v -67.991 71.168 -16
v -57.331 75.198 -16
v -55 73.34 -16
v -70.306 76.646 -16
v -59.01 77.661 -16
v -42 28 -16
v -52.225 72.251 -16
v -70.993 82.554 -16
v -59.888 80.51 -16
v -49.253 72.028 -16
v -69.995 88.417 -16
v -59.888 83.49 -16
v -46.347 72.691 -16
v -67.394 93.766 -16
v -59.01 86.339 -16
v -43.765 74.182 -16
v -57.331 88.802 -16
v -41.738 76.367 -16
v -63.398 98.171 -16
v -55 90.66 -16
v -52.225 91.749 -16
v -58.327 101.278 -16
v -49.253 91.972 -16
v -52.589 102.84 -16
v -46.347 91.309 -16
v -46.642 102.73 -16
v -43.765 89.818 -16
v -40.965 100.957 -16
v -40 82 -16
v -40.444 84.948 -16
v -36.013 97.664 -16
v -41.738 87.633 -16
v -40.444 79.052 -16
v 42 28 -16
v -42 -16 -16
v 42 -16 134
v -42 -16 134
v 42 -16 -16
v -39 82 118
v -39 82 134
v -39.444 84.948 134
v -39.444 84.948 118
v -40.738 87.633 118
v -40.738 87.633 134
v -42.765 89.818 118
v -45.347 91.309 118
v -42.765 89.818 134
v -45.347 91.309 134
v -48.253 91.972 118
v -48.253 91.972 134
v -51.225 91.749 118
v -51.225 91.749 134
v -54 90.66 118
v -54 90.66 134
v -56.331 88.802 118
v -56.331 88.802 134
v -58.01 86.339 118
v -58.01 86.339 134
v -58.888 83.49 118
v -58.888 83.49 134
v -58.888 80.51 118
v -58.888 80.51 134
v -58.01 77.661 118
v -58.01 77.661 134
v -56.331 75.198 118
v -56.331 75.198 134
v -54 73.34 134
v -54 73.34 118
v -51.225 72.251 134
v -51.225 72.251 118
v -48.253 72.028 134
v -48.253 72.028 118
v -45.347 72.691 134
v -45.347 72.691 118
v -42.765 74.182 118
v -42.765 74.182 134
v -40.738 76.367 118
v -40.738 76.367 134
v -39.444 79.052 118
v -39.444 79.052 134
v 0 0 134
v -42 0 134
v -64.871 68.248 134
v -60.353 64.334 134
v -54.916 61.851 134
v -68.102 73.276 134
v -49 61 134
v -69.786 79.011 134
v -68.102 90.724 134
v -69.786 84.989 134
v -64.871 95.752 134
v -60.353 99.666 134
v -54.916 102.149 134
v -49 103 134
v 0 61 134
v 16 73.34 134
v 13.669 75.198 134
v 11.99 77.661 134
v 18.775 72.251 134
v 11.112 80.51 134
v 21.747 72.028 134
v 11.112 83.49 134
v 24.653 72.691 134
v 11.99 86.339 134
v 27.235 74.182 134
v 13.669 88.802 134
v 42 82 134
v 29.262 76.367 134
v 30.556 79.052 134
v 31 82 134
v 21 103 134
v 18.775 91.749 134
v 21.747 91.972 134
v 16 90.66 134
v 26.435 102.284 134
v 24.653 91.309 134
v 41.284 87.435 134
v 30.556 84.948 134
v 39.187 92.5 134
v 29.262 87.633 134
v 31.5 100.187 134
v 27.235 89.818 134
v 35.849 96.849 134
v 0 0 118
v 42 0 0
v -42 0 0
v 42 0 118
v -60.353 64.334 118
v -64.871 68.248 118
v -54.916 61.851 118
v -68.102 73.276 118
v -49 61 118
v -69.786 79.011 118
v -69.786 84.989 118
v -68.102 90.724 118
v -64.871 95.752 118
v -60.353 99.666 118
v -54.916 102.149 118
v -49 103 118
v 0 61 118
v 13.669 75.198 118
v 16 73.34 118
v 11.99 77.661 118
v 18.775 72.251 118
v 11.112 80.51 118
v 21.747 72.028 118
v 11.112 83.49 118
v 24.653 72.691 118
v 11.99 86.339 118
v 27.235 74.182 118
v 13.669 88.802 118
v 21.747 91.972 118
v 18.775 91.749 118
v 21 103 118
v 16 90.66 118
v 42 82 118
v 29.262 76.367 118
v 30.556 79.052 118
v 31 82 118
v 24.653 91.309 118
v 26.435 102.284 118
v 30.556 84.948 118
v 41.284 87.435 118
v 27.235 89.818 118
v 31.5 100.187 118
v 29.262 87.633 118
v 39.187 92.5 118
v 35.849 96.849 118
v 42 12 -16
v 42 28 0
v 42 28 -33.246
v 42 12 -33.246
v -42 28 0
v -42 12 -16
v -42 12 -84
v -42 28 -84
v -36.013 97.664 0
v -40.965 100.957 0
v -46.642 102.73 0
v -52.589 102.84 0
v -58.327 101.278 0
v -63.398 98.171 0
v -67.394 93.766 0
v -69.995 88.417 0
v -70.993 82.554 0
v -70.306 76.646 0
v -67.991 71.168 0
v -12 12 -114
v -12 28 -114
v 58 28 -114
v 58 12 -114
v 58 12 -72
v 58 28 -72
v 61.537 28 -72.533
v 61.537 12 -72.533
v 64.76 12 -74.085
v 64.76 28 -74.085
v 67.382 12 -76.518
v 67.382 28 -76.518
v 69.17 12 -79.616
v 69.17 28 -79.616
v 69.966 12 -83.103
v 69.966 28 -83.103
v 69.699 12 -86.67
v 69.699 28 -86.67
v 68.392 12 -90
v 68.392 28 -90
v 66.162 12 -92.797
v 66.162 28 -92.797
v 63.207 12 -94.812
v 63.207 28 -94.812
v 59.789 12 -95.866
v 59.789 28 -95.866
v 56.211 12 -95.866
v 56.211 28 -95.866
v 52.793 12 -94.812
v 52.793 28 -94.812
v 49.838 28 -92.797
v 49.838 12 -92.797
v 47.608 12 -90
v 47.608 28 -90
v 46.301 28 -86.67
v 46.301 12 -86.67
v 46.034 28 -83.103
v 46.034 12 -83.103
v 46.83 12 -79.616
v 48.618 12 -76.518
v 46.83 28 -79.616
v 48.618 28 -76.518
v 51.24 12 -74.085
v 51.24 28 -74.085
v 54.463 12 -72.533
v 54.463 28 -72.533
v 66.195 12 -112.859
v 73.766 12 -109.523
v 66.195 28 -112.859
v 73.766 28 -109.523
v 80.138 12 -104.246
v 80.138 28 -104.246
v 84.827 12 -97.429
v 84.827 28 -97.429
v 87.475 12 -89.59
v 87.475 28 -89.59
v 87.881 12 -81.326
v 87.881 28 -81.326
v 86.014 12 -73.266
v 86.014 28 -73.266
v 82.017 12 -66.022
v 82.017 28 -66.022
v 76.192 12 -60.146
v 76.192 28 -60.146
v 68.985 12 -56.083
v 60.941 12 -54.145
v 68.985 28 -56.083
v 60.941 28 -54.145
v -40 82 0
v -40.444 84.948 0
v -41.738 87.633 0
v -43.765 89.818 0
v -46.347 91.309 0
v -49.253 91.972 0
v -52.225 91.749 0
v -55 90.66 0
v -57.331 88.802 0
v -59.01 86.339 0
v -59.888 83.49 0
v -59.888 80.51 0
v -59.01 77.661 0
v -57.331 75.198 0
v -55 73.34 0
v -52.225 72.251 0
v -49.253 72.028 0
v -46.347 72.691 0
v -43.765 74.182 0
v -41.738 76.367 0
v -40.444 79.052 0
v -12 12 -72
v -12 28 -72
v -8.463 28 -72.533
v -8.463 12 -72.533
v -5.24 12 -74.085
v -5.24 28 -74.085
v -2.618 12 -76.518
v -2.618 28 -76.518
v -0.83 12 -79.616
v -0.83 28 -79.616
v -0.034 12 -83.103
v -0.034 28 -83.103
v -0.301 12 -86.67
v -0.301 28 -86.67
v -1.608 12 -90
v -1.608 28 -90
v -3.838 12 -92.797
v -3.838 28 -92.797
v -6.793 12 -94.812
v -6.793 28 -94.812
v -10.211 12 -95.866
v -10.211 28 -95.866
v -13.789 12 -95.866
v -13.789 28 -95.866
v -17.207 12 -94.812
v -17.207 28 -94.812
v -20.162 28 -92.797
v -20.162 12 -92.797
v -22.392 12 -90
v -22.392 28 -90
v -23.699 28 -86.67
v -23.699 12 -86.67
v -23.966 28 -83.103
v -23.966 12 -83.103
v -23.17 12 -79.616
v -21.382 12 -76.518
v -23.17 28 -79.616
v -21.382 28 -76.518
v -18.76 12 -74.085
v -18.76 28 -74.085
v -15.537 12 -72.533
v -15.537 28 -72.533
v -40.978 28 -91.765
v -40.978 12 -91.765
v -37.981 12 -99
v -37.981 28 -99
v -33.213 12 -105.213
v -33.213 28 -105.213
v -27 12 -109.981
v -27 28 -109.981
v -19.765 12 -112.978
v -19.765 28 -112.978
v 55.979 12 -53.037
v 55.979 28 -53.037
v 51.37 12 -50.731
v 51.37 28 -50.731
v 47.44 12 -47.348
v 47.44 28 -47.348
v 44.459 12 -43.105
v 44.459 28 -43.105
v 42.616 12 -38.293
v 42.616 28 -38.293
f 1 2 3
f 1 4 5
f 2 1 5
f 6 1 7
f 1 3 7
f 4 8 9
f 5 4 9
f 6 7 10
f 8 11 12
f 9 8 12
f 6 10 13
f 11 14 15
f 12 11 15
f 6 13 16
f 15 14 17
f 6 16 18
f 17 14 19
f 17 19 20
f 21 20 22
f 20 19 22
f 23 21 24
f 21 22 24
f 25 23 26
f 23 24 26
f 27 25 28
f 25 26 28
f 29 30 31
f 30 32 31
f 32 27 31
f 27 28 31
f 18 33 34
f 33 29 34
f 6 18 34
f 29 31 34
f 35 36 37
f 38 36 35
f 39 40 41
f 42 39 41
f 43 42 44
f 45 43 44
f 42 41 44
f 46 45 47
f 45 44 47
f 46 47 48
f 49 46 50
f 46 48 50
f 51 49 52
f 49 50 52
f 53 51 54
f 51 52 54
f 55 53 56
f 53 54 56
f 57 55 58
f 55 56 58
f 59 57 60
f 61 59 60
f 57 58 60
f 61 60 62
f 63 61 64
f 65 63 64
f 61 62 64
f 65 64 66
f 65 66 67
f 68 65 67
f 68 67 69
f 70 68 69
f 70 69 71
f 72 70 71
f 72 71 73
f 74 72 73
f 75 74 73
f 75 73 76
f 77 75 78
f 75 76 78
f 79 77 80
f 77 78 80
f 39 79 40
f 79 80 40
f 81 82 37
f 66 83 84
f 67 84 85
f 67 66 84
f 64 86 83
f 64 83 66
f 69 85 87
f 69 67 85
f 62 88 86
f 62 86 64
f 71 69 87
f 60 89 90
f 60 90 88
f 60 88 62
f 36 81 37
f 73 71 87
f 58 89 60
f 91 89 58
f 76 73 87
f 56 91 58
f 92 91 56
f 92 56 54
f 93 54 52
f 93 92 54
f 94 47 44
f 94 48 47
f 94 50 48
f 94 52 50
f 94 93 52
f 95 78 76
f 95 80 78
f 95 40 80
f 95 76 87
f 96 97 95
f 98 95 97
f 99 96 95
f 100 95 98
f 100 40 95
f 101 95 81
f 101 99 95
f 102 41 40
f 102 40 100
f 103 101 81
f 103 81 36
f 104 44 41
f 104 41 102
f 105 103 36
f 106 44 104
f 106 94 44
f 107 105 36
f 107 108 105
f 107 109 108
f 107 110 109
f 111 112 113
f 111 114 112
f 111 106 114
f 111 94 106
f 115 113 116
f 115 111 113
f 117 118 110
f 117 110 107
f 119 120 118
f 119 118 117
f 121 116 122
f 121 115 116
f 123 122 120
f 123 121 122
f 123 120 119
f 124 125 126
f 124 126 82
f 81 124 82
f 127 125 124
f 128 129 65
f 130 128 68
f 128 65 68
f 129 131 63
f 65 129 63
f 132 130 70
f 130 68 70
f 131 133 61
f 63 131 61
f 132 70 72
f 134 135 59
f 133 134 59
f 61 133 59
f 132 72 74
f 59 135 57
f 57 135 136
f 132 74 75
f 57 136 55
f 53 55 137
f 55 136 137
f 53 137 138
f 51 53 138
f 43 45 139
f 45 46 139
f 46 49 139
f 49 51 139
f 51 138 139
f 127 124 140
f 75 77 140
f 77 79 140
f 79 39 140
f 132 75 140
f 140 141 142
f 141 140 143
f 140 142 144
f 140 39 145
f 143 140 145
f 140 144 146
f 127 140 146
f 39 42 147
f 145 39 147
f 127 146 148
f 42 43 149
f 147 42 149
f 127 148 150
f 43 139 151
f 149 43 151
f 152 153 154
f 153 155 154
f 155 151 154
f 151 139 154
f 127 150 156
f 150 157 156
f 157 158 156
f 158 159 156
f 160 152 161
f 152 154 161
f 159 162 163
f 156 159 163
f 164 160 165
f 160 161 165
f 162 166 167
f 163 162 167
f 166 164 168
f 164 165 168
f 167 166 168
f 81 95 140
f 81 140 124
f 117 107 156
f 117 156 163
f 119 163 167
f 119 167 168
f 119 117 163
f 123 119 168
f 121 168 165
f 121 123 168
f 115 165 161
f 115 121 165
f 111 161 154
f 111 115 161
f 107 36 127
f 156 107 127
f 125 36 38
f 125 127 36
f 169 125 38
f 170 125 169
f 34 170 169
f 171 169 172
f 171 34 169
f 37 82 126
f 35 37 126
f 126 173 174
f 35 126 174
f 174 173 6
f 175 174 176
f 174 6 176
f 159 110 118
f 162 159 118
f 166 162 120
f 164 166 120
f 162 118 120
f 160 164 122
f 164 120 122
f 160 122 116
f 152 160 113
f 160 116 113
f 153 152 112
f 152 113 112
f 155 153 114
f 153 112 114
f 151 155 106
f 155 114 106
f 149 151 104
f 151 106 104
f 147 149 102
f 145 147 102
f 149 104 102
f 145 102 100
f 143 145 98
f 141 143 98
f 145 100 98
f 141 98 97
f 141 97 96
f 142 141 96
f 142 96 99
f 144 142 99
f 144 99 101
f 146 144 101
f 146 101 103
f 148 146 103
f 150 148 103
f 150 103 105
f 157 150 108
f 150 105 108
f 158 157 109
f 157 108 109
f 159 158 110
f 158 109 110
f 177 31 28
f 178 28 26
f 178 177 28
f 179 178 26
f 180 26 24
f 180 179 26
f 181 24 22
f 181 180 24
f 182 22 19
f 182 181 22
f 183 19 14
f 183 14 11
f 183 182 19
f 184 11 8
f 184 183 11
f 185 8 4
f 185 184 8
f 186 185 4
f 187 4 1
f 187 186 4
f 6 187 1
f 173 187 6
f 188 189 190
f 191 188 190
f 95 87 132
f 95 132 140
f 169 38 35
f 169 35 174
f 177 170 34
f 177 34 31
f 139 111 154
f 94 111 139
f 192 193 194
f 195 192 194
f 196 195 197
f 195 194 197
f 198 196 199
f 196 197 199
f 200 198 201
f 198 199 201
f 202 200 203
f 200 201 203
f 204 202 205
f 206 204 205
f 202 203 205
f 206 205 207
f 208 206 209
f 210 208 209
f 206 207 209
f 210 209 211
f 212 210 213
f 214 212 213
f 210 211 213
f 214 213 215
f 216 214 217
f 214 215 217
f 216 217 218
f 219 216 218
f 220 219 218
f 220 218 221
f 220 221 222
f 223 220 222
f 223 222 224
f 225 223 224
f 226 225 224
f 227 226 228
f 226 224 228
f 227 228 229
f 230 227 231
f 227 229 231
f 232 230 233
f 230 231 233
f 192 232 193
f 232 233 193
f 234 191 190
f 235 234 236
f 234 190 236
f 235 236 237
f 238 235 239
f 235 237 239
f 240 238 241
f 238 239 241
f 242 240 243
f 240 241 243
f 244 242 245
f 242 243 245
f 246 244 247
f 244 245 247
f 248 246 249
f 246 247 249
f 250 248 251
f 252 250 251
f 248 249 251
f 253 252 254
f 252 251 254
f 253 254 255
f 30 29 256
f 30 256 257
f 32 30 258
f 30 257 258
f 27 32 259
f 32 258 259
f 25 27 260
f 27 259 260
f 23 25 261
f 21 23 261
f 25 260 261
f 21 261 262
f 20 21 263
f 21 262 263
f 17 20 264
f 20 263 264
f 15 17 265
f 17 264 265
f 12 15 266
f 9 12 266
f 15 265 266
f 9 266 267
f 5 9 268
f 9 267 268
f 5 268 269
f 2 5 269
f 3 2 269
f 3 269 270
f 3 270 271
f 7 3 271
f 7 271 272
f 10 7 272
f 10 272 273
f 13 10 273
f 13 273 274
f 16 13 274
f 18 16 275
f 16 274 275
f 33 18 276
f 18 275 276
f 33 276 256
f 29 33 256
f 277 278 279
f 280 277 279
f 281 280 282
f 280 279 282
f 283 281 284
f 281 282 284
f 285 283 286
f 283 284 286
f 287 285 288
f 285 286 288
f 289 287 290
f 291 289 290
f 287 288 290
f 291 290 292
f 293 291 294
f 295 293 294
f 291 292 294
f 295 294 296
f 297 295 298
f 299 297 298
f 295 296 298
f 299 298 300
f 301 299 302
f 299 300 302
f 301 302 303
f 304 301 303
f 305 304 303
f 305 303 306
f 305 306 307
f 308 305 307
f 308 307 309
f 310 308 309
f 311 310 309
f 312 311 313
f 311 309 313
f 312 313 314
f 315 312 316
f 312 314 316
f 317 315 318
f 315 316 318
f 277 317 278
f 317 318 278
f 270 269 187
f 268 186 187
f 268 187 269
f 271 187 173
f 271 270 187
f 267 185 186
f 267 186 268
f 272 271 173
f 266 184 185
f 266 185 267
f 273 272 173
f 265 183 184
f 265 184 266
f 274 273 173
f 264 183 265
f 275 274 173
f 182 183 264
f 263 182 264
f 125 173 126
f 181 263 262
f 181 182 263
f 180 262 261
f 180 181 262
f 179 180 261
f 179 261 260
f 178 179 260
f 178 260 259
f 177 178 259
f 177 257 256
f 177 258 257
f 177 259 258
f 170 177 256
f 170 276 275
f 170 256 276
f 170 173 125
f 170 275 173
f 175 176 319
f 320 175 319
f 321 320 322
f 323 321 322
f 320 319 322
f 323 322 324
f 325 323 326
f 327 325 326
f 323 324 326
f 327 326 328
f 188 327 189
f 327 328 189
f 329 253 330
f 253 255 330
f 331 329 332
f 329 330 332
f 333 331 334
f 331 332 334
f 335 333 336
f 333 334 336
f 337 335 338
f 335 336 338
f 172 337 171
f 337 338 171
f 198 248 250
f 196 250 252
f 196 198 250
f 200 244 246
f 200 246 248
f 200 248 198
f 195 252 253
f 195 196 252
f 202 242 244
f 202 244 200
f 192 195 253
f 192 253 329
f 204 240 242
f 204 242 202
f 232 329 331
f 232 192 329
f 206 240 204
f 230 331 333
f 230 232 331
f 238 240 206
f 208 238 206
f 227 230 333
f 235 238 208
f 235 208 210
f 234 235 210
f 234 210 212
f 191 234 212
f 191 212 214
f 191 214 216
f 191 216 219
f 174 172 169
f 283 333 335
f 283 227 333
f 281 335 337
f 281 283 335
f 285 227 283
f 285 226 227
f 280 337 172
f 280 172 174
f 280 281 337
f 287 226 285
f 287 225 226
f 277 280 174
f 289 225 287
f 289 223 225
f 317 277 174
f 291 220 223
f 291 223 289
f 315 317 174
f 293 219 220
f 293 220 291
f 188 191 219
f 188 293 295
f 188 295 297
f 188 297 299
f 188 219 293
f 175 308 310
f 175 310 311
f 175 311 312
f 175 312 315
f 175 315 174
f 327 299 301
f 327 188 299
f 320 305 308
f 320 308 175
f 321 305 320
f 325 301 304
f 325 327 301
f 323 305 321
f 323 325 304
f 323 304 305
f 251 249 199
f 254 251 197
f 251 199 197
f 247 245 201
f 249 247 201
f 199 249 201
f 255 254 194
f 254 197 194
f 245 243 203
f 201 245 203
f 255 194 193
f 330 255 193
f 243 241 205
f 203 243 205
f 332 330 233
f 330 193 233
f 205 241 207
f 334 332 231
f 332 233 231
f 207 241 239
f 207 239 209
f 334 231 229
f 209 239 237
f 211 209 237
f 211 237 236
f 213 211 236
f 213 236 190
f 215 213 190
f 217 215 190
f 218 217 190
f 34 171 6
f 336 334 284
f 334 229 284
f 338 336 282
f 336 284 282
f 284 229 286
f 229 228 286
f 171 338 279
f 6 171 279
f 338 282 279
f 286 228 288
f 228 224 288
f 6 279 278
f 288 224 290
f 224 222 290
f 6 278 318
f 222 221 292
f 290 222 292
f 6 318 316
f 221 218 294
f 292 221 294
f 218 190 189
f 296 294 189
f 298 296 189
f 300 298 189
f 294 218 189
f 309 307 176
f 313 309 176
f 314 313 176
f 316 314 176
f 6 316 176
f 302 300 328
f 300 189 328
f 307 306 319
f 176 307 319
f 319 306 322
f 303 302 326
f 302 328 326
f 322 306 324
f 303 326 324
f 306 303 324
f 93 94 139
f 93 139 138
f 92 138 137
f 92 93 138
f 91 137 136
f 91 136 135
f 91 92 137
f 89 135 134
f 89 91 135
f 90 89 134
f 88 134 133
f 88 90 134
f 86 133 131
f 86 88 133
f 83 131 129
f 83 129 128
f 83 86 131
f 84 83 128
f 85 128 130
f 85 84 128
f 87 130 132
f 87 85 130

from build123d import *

# Parameters (mm, degrees)
BOSS_EXTRUDE1_DEPTH = 42
BOSS_EXTRUDE3_DEPTH = 16
SKETCH7_R           = 10
CUT_EXTRUDE2_DEPTH  = 16
BOSS_EXTRUDE4_DEPTH = 16
SKETCH9_R           = 12
CUT_EXTRUDE3_DEPTH  = 16
FILLET1_R           = 21
BOSS_EXTRUDE5_DEPTH = 16
SKETCH12_R          = 10
CUT_EXTRUDE5_DEPTH  = 16


with BuildPart() as part:
    # Sketch2 → Boss-Extrude1 (new, symmetric)
    with BuildSketch(Plane(origin=(0, 0, 0), x_dir=(0, 0, -1), z_dir=(1, 0, 0))):
        Polygon((0, 0), (-134, 0), (-134, -16), (16, -16), (16, 12), (84, 12), (84, 28), (0, 28), align=None)
    extrude(amount=BOSS_EXTRUDE1_DEPTH, both=True)

    # Sketch6 → Boss-Extrude3 (add)
    with BuildSketch(Plane.XY):
        with BuildLine():
            Line((-67.990788091, 71.168031394), (-42, 28))
            Line((-42, 28), (42, 28))
            Line((42, 28), (-36.012593074, 97.663730318))
            ThreePointArc((-36.012593074, 97.663730318), (-63.398219306, 98.170581914), (-67.990788091, 71.168031394))
        make_face()
    extrude(amount=-BOSS_EXTRUDE3_DEPTH)

    # Sketch7 → Cut-Extrude2 (cut)
    with BuildSketch(Plane.XY):
        with Locations((-50, 82)):
            Circle(SKETCH7_R)
    extrude(amount=-CUT_EXTRUDE2_DEPTH, mode=Mode.SUBTRACT)

    # Sketch8 → Boss-Extrude4 (add)
    with BuildSketch(Plane(origin=(0, 28, 0), x_dir=(1, 0, 0), z_dir=(0, 1, 0))):
        with BuildLine():
            Line((-12, 114), (58, 114))
            ThreePointArc((58, 114), (88, 84), (58, 54))
            Line((58, 54), (-12, 54))
            ThreePointArc((-12, 54), (-42, 84), (-12, 114))
        make_face()
    extrude(amount=-BOSS_EXTRUDE4_DEPTH)

    # Sketch9 → Cut-Extrude3 (cut)
    with BuildSketch(Plane(origin=(0, 28, 0), x_dir=(1, 0, 0), z_dir=(0, 1, 0))):
        with Locations(Location((-12, 84, 0), (0, 0, 270))):
            Circle(SKETCH9_R)
        with Locations(Location((58, 84, 0), (0, 0, 270))):
            Circle(SKETCH9_R)
    extrude(amount=-CUT_EXTRUDE3_DEPTH, mode=Mode.SUBTRACT)

    # Fillet1
    fillet1_edges = [part.edges().sort_by_distance(p)[0] for p in [
        (42, 20, -54),
    ]]
    fillet(fillet1_edges, radius=FILLET1_R)

    # Sketch11 → Boss-Extrude5 (add)
    with BuildSketch(Plane.XY.offset(134)):
        with BuildLine():
            Line((0, 61), (0, 0))
            Line((0, 0), (42, 0))
            Line((42, 0), (42, 82))
            ThreePointArc((42, 82), (35.849242405, 96.849242405), (21, 103))
            Line((21, 103), (-49, 103))
            ThreePointArc((-49, 103), (-70, 82), (-49, 61))
            Line((-49, 61), (0, 61))
        make_face()
    extrude(amount=-BOSS_EXTRUDE5_DEPTH)

    # Sketch12 → Cut-Extrude5 (cut)
    with BuildSketch(Plane.XY.offset(134)):
        with Locations((-49, 82)):
            Circle(SKETCH12_R)
        with Locations((21, 82)):
            Circle(SKETCH12_R)
    extrude(amount=-CUT_EXTRUDE5_DEPTH, mode=Mode.SUBTRACT)


solid = part.part
